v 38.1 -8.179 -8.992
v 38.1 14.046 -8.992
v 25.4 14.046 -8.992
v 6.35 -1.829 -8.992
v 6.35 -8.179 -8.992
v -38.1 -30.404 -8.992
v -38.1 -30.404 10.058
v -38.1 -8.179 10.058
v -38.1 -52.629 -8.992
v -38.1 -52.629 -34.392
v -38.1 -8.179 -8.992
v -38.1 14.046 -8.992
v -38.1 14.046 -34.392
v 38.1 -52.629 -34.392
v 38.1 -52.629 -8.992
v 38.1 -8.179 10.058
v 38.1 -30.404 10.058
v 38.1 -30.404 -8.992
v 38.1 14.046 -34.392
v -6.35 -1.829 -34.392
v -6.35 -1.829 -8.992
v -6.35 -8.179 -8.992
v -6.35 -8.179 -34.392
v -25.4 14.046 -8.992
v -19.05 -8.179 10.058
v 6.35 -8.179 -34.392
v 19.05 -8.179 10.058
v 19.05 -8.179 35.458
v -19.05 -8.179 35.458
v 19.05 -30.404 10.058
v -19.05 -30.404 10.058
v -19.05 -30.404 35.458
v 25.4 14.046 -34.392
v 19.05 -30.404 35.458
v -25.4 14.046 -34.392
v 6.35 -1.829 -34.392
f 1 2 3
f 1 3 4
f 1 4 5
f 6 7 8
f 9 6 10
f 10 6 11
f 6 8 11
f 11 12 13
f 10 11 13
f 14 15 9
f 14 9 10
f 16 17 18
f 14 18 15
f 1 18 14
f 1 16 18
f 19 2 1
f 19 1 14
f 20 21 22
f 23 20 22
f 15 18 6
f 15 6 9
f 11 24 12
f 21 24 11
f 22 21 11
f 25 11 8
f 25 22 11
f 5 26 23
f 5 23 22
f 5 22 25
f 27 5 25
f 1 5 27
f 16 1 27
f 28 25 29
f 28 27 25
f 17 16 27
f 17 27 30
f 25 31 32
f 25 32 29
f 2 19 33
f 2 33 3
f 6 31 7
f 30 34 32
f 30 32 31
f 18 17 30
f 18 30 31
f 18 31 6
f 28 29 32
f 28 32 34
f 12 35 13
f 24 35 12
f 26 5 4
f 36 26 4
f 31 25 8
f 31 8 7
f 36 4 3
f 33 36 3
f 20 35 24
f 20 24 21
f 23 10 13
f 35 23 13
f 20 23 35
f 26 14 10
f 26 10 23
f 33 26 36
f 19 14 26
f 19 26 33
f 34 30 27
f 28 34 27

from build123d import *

# Parameters (mm, degrees)
BOSS_EXTRUDE1_DEPTH = 38.1
SKETCH2_W           = 38.1
SKETCH2_H           = 22.225
BOSS_EXTRUDE2_DEPTH = 25.4
CUT_EXTRUDE1_DEPTH  = 25.4


with BuildPart() as part:
    # Sketch1 → Boss-Extrude1 (new body, symmetric)
    with BuildSketch(Plane(origin=(0, 0, 0), x_dir=(0, 0, -1), z_dir=(1, 0, 0))):
        Polygon((-10.0584, -30.4038), (8.9916, -30.4038), (8.9916, -52.6288), (34.3916, -52.6288), (34.3916, 14.0462), (8.9916, 14.0462), (8.9916, -8.1788), (-10.0584, -8.1788), align=None)
    extrude(amount=BOSS_EXTRUDE1_DEPTH, both=True)

    # Sketch2 → Boss-Extrude2 (add)
    with BuildSketch(Plane.XY.offset(10.0584)):
        with Locations((0, -19.2913)):
            Rectangle(SKETCH2_W, SKETCH2_H)
    extrude(amount=BOSS_EXTRUDE2_DEPTH)

    # Sketch3 → Cut-Extrude1 (cut)
    with BuildSketch(Plane.XY.offset(-8.9916)):
        Polygon((6.35, -1.8288), (25.4, 14.0462), (-25.4, 14.0462), (-6.35, -1.8288), (-6.35, -8.1788), (6.35, -8.1788), align=None)
    extrude(amount=-CUT_EXTRUDE1_DEPTH, mode=Mode.SUBTRACT)


solid = part.part
